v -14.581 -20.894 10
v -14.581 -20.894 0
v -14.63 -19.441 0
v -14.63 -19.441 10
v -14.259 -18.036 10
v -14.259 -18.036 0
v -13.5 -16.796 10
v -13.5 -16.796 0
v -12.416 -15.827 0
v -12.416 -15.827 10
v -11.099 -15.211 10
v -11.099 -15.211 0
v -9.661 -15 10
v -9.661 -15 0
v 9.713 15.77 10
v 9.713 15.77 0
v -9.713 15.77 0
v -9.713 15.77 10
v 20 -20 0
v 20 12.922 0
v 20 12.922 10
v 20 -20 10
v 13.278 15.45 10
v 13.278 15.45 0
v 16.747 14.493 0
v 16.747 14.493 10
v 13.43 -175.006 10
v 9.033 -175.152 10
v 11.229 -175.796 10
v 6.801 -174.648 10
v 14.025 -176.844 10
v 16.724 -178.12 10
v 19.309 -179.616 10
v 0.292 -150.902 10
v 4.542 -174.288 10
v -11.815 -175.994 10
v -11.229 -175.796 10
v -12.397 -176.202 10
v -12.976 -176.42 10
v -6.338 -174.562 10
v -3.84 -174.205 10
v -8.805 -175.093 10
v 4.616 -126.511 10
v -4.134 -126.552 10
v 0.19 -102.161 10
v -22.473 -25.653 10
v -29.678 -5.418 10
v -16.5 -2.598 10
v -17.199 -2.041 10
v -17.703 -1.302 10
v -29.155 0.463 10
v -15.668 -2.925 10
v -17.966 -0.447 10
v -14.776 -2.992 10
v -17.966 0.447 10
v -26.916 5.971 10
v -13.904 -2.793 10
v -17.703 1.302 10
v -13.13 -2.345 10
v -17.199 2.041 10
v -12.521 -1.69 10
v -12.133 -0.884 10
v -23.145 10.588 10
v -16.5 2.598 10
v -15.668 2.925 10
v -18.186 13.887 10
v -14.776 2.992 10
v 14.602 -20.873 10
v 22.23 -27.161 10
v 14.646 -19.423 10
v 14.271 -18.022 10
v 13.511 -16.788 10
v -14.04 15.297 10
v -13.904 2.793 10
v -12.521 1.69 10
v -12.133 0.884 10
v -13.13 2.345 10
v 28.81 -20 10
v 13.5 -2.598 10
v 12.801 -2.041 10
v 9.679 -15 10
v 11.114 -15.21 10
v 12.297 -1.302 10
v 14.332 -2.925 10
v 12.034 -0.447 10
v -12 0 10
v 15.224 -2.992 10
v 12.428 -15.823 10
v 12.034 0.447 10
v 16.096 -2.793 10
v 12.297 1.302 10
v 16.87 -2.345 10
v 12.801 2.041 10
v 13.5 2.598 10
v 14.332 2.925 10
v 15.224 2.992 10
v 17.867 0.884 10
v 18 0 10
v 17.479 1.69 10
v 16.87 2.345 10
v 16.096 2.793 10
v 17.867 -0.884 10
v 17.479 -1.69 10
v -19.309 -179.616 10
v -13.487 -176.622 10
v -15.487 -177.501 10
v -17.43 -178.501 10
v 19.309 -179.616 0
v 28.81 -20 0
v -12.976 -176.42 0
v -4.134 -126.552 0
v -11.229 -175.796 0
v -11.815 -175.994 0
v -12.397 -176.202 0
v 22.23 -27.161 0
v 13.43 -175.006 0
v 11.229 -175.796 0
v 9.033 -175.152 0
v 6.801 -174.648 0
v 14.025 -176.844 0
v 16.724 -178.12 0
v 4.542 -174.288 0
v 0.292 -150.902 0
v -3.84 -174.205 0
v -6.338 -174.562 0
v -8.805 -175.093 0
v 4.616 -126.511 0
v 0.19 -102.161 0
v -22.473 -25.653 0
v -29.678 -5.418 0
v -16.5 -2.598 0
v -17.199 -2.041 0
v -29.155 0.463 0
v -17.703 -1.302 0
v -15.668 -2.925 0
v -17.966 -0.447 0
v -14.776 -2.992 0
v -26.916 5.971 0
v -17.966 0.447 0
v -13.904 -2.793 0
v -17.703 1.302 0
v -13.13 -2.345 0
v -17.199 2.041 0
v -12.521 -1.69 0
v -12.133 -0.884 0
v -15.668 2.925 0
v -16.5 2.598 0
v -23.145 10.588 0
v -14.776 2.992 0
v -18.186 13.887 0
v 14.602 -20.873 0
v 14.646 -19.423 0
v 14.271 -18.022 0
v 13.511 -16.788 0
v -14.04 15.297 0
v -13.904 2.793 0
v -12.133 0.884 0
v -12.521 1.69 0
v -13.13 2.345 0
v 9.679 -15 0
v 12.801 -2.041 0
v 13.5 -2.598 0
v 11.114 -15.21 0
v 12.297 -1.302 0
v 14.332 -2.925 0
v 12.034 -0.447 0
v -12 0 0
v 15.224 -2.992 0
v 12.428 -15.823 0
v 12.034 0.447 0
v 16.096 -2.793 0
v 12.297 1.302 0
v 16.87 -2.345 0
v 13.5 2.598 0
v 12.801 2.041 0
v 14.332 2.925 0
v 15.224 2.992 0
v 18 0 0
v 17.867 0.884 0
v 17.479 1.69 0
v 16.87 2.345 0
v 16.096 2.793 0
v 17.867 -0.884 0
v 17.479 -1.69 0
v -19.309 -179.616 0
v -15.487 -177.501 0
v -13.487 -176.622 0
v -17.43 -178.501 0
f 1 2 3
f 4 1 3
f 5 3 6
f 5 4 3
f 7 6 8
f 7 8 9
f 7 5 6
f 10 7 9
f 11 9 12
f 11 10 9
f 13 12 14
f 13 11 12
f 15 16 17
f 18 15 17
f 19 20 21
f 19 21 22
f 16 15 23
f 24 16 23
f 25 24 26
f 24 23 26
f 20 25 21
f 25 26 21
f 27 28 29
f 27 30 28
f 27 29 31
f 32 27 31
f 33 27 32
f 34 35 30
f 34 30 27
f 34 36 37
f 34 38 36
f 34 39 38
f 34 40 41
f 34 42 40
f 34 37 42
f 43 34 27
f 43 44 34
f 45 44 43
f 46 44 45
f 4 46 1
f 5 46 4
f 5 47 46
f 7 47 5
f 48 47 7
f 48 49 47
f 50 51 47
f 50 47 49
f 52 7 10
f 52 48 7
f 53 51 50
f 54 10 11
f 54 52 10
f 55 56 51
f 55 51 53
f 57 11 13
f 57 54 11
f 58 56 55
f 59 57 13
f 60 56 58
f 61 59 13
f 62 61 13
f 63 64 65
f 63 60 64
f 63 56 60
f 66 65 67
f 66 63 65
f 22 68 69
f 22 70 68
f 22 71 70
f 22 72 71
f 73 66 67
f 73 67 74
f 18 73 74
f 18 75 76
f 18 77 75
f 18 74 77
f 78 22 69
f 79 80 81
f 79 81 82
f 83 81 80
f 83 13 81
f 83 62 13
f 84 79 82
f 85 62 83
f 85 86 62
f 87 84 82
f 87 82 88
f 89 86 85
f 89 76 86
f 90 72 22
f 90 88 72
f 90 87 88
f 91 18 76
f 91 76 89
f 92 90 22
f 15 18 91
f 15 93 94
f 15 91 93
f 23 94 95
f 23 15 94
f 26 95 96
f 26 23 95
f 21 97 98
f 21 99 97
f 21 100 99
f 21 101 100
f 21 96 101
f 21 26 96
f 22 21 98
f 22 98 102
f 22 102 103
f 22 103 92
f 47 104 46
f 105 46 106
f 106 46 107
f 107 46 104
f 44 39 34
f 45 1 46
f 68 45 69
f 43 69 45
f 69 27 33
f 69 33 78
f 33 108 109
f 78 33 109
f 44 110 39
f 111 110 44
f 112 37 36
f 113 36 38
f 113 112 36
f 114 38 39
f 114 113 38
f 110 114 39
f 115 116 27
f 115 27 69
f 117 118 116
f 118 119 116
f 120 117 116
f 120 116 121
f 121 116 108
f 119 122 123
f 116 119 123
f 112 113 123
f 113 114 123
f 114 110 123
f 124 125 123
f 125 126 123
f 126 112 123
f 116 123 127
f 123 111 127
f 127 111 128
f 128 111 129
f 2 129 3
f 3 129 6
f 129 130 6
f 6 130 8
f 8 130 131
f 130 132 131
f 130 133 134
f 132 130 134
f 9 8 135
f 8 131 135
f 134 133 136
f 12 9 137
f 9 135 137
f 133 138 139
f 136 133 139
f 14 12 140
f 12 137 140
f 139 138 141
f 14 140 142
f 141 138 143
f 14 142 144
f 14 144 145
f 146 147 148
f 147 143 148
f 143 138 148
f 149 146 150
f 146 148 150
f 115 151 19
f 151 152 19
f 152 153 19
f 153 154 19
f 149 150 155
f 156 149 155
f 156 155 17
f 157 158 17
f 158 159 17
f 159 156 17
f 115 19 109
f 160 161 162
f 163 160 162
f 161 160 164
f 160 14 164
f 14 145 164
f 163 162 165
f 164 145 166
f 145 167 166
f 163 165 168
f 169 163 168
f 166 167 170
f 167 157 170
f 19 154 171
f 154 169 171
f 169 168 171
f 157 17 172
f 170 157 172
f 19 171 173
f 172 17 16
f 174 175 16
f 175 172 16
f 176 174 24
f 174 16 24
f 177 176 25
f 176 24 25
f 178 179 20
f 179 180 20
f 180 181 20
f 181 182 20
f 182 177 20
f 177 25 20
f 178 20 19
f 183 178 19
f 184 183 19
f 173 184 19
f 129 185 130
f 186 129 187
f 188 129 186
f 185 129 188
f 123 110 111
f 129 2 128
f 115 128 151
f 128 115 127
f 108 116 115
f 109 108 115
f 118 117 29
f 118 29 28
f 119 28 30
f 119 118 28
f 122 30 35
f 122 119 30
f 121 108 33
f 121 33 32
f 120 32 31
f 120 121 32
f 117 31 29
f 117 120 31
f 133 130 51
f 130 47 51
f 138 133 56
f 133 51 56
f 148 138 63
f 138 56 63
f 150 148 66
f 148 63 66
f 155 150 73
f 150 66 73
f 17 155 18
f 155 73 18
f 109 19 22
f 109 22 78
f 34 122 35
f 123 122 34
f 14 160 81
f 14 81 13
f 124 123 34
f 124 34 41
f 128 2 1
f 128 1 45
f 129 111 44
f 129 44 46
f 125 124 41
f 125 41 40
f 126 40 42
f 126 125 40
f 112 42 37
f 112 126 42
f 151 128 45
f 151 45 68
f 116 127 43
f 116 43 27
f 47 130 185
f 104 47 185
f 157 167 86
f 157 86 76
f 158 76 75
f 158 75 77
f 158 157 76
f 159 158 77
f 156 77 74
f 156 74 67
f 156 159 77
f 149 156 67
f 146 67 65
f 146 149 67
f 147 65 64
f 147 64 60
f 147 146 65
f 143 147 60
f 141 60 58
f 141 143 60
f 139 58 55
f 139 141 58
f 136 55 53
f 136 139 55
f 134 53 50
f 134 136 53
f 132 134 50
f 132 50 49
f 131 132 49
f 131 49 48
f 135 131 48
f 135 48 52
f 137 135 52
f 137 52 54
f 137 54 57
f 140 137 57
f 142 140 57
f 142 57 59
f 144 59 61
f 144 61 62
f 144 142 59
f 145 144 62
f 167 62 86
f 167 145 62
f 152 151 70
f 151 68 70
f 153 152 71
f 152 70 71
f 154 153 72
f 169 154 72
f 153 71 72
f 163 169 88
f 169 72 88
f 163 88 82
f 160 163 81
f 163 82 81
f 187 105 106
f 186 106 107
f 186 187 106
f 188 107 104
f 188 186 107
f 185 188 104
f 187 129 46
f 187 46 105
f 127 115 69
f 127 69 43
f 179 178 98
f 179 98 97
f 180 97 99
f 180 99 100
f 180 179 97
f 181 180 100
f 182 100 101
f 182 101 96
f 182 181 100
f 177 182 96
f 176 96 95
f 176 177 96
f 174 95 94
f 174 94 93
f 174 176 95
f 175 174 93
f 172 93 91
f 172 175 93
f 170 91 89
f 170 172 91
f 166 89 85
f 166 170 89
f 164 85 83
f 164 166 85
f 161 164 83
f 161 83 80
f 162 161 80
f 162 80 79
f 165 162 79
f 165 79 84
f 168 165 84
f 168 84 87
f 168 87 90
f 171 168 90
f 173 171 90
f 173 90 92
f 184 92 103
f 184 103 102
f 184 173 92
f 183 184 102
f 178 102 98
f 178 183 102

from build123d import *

# Parameters (mm, degrees)
SKETCH1_R           = 3
BOSS_EXTRUDE2_DEPTH = 10
FILLET1_R           = 20
FILLET2_R           = 20
CUT_EXTRUDE1_START  = -10
CUT_EXTRUDE1_DEPTH  = 10
FILLET3_R           = 5
CUT_EXTRUDE5_START  = -10
SKETCH5_W           = 12
SKETCH5_H           = 10
CUT_EXTRUDE5_DEPTH  = 10


with BuildPart() as part:
    # Sketch1 → Boss-Extrude2 (new body)
    with BuildSketch(Plane.XY):
        with BuildLine():
            Line((-30, 15.770412854), (-30, 0))
            Line((-30, 0), (-17.5, -210))
            ThreePointArc((-17.5, -210), (0, -227.5), (17.5, -210))
            Line((17.5, -210), (30, 0))
            Line((30, 0), (30, 15.770412854))
            Line((30, 15.770412854), (-30, 15.770412854))
        make_face()
        with Locations((-15, 0)):
            Circle(SKETCH1_R, mode=Mode.SUBTRACT)
        with Locations((15, 0)):
            Circle(SKETCH1_R, mode=Mode.SUBTRACT)
        Polygon((0, -205), (6, -205), (6, -215), (-6, -215), (-6, -205), align=None, mode=Mode.SUBTRACT)
    extrude(amount=BOSS_EXTRUDE2_DEPTH)

    # Fillet1
    fillet1_edges = [part.edges().sort_by_distance(p)[0] for p in [
        (-30, 15.770412854, 5),
    ]]
    fillet(fillet1_edges, radius=FILLET1_R)

    # Fillet2
    fillet2_edges = [part.edges().sort_by_distance(p)[0] for p in [
        (30, 15.770412854, 5),
    ]]
    fillet(fillet2_edges, radius=FILLET2_R)

    # Sketch4 → Cut-Extrude1 (cut)
    with BuildSketch(Plane.XY.offset(10).offset(CUT_EXTRUDE1_START)):
        Polygon((-15.651797422, -15), (0.190220551, -102.160979768), (15.643622882, -15), (15, -15), align=None)
        Polygon((-22.473027071, -25.6531452), (-13.367328465, -178.628881795), (-4.134156204, -126.551525408), align=None)
        Polygon((22.230419841, -27.161313899), (4.615986353, -126.511039477), (13.430162671, -175.005634359), align=None)
        with BuildLine():
            Line((0.291609598, -150.901585116), (-7.372445375, -194.128735111))
            ThreePointArc((-7.372445375, -194.128735111), (0.476576628, -192.506490497), (8.225632191, -194.553674383))
            Line((8.225632191, -194.553674383), (0.291609598, -150.901585116))
        make_face()
    extrude(amount=CUT_EXTRUDE1_DEPTH, mode=Mode.SUBTRACT)

    # Fillet3
    fillet3_edges = [part.edges().sort_by_distance(p)[0] for p in [
        (8.225632191, -194.553674383, 5),
        (-7.372445375, -194.128735111, 5),
        (-15.651797422, -15, 5),
        (15.643622882, -15, 5),
    ]]
    fillet(fillet3_edges, radius=FILLET3_R)

    # Sketch5 → Cut-Extrude5 (cut)
    # profile 1 of 10: a face of its own
    with BuildSketch(Plane.XY.offset(10).offset(CUT_EXTRUDE5_START)):
        with BuildLine():
            Line((29.260488635, 0), (20, 0))
            Line((20, 0), (20, -20))
            Line((20, -20), (28.80952381, -20))
            Line((28.80952381, -20), (29.677502384, -5.417959945))
            ThreePointArc((29.677502384, -5.417959945), (29.653859351, -2.694751229), (29.260488635, 0))
        make_face()
    # profile 2 of 10: a face of its own
    with BuildSketch(Plane.XY.offset(10).offset(CUT_EXTRUDE5_START)):
        with BuildLine():
            Line((20, 12.921923742), (20, 0))
            Line((20, 0), (29.260488635, 0))
            ThreePointArc((29.260488635, 0), (25.96931496, 7.420606017), (20, 12.921923742))
        make_face()
    # profile 3 of 10: a face of its own
    with BuildSketch(Plane.XY.offset(10).offset(CUT_EXTRUDE5_START)):
        with BuildLine():
            Line((4.816305425, -175.795946561), (11.228656567, -175.795946561))
            ThreePointArc((11.228656567, -175.795946561), (7.921392788, -174.882318751), (4.542172021, -174.287695771))
            Line((4.542172021, -174.287695771), (4.816305425, -175.795946561))
        make_face()
    # profile 4 of 10: a face of its own
    with BuildSketch(Plane.XY.offset(10).offset(CUT_EXTRUDE5_START)):
        with BuildLine():
            ThreePointArc((19.308563513, -179.61613298), (15.387621929, -177.454323), (11.228656567, -175.795946561))
            Line((11.228656567, -175.795946561), (4.816305425, -175.795946561))
            Line((4.816305425, -175.795946561), (4.879901452, -176.145844664))
            ThreePointArc((4.879901452, -176.145844664), (12.347146855, -178.102269105), (19.185515511, -181.683339422))
            Line((19.185515511, -181.683339422), (19.308563513, -179.61613298))
        make_face()
    # profile 5 of 10: a face of its own
    with BuildSketch(Plane.XY.offset(10).offset(CUT_EXTRUDE5_START)):
        with BuildLine():
            Line((18.887385797, -186.691918617), (19.185515511, -181.683339422))
            ThreePointArc((19.185515511, -181.683339422), (12.347146855, -178.102269105), (4.879901452, -176.145844664))
            Line((4.879901452, -176.145844664), (5.679005105, -180.54242201))
            ThreePointArc((5.679005105, -180.54242201), (12.662186526, -182.803142969), (18.887385797, -186.691918617))
        make_face()
    # profile 6 of 10: a face of its own
    with BuildSketch(Plane.XY.offset(10).offset(CUT_EXTRUDE5_START)):
        with BuildLine():
            Line((17.5, -210), (18.887385797, -186.691918617))
            ThreePointArc((18.887385797, -186.691918617), (12.662186526, -182.803142969), (5.679005105, -180.54242201))
            Line((5.679005105, -180.54242201), (6.795310384, -186.684206595))
            ThreePointArc((6.795310384, -186.684206595), (5.577551358, -190.939561161), (1.45903868, -192.560928748))
            ThreePointArc((1.45903868, -192.560928748), (0.292984986, -192.502452749), (-0.874372768, -192.521857299))
            ThreePointArc((-0.874372768, -192.521857299), (-4.874459747, -190.834989527), (-6.047413252, -186.655228912))
            Line((-6.047413252, -186.655228912), (-4.940068564, -180.409533248))
            ThreePointArc((-4.940068564, -180.409533248), (-12.320876057, -182.646828096), (-18.887385797, -186.691918617))
            Line((-18.887385797, -186.691918617), (-17.5, -210))
            ThreePointArc((-17.5, -210), (0, -227.5), (17.5, -210))
        make_face()
        with Locations((0, -210)):
            Rectangle(SKETCH5_W, SKETCH5_H, mode=Mode.SUBTRACT)
    # profile 7 of 10: a face of its own
    with BuildSketch(Plane.XY.offset(10).offset(CUT_EXTRUDE5_START)):
        with BuildLine():
            Line((-4.167269409, -176.050756454), (-4.122092315, -175.795946561))
            Line((-4.122092315, -175.795946561), (-11.228656567, -175.795946561))
            ThreePointArc((-11.228656567, -175.795946561), (-12.106175916, -176.096600396), (-12.975657802, -176.419763184))
            Line((-12.975657802, -176.419763184), (-13.345719148, -178.506999951))
            ThreePointArc((-13.345719148, -178.506999951), (-8.842198544, -176.958619935), (-4.167269409, -176.050756454))
        make_face()
    # profile 8 of 10: a face of its own
    with BuildSketch(Plane.XY.offset(10).offset(CUT_EXTRUDE5_START)):
        with BuildLine():
            Line((-4.122092315, -175.795946561), (-3.840092025, -174.205395752))
            ThreePointArc((-3.840092025, -174.205395752), (-7.576229867, -174.806240028), (-11.228656567, -175.795946561))
            Line((-11.228656567, -175.795946561), (-4.122092315, -175.795946561))
        make_face()
    # profile 9 of 10: a face of its own
    with BuildSketch(Plane.XY.offset(10).offset(CUT_EXTRUDE5_START)):
        with BuildLine():
            ThreePointArc((-13.486799408, -176.621769943), (-16.46588928, -177.986339006), (-19.308563513, -179.61613298))
            Line((-19.308563513, -179.61613298), (-19.185515511, -181.683339422))
            ThreePointArc((-19.185515511, -181.683339422), (-16.356398794, -179.96026814), (-13.373872309, -178.518945203))
            Line((-13.373872309, -178.518945203), (-13.486799408, -176.621769943))
        make_face()
    # profile 10 of 10: a face of its own
    with BuildSketch(Plane.XY.offset(10).offset(CUT_EXTRUDE5_START)):
        with BuildLine():
            Line((-4.940068564, -180.409533248), (-4.167269409, -176.050756454))
            ThreePointArc((-4.167269409, -176.050756454), (-8.842198544, -176.958619935), (-13.345719148, -178.506999951))
            Line((-13.345719148, -178.506999951), (-13.367328465, -178.628881795))
            Line((-13.367328465, -178.628881795), (-13.373872309, -178.518945203))
            ThreePointArc((-13.373872309, -178.518945203), (-16.356398794, -179.96026814), (-19.185515511, -181.683339422))
            Line((-19.185515511, -181.683339422), (-18.887385797, -186.691918617))
            ThreePointArc((-18.887385797, -186.691918617), (-12.320876057, -182.646828096), (-4.940068564, -180.409533248))
        make_face()
    extrude(amount=CUT_EXTRUDE5_DEPTH, mode=Mode.SUBTRACT)


solid = part.part
